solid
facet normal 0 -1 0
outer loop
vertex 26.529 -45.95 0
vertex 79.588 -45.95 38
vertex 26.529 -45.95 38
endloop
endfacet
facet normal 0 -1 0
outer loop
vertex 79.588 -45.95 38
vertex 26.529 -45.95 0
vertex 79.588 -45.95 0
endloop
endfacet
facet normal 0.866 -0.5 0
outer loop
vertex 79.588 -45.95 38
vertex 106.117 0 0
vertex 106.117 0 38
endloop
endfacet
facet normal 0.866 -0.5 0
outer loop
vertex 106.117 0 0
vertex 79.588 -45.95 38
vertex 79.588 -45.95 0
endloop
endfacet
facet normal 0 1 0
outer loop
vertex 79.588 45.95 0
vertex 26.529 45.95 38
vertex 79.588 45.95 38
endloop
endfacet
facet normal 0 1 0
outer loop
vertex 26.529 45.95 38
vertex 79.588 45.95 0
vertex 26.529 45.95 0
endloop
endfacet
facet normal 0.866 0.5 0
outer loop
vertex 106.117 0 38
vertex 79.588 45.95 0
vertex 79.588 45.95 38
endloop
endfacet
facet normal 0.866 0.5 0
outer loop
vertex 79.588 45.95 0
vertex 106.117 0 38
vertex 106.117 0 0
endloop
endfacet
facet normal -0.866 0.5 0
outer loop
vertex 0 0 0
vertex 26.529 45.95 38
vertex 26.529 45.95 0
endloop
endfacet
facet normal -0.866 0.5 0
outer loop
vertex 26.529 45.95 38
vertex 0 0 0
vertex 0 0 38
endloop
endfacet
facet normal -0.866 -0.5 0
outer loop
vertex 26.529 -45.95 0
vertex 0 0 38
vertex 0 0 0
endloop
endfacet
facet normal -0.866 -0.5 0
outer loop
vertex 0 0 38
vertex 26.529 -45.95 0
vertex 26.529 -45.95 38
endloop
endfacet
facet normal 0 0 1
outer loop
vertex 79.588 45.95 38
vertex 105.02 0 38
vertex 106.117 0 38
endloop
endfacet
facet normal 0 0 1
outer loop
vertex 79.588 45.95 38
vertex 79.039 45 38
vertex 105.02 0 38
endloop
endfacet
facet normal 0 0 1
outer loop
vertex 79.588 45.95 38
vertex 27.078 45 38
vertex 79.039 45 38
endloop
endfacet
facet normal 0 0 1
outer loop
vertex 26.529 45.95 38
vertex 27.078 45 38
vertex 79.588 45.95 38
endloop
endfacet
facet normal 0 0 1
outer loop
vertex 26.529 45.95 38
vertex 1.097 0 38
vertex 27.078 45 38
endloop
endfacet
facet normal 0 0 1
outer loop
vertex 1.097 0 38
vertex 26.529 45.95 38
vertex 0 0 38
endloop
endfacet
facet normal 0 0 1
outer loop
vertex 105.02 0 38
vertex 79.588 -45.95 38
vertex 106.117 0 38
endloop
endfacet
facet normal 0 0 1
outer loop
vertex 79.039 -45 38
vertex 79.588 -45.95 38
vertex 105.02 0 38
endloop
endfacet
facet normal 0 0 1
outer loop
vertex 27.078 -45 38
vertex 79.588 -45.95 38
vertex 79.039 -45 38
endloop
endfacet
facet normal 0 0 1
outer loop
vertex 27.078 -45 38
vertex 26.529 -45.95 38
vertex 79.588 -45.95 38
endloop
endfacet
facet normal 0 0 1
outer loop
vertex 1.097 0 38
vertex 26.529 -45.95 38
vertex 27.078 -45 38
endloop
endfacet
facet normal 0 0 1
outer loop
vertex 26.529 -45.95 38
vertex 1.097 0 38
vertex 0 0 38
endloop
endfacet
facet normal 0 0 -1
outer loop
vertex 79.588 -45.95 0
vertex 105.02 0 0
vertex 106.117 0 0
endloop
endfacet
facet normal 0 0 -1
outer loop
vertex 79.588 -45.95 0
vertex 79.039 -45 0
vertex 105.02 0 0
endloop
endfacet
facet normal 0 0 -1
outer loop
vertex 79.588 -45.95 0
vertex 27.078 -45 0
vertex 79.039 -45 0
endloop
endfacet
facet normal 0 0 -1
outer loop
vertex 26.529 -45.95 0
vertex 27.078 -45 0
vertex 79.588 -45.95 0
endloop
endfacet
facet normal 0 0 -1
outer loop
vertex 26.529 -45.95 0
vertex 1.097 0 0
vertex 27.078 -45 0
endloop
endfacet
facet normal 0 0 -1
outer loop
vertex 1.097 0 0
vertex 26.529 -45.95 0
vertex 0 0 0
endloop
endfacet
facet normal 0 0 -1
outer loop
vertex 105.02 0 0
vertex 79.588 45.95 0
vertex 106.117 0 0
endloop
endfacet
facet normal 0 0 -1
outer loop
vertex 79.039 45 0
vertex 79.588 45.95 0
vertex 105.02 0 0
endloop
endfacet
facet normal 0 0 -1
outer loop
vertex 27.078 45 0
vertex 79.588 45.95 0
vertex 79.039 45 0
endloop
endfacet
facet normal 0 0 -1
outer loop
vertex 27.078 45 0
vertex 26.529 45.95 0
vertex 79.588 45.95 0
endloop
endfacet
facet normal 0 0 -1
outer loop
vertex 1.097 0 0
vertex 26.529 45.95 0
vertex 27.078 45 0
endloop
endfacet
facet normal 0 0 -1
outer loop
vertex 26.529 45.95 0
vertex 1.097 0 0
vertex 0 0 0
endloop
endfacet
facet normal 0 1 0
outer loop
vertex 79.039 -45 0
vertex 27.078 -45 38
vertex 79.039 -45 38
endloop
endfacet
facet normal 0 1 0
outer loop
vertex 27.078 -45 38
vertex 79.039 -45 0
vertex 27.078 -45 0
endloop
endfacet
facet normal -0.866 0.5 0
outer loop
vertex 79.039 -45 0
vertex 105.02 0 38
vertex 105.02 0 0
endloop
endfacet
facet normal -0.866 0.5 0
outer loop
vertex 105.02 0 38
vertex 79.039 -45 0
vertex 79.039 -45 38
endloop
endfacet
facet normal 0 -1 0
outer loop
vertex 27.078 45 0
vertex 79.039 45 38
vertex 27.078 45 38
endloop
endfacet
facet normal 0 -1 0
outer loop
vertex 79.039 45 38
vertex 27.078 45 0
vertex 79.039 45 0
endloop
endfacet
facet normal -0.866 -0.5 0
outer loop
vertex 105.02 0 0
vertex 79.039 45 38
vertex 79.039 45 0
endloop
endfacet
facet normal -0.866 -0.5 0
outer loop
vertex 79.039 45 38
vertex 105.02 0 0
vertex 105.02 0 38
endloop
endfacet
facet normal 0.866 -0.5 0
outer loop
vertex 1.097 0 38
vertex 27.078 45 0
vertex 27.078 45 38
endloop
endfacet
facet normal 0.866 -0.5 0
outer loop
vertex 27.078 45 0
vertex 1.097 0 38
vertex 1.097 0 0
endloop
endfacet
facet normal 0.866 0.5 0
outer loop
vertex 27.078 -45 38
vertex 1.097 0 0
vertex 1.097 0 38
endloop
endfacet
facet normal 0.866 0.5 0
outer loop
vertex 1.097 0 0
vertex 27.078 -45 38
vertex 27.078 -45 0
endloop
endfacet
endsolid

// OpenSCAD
// file: measurements.scad
thickness = 1.9;
finger_d = 22;

module holder(h) {
    // Child 0 is the outer shape
    // Child 1 is the inner shape
    // Child 2 is the end-cap hole shape
    // Bottom end
    difference() {
        linear_extrude(thickness) { children(0); }
        translate([0, 0, -1])
            linear_extrude(thickness+2) { children(2); }
    }
    // Main chamber: h + thickness to leave room for the lid.
    translate([0, 0, thickness])
        difference() {
            linear_extrude(h + thickness) { children(0); }
            translate([0, 0, -1])
                linear_extrude(h + thickness + 2) { children(1); }
        }
}

module lid() {
    // Child 0 is the outer shape
    // Child 1 is the inner shape
    // Child 2 is the end-cap hole shape
    // Bottom end
    difference() {
        linear_extrude(thickness) { children(0); }
        translate([0, 0, -1])
            linear_extrude(thickness+2) { children(2); }
    }
    // Cap plug
    translate([0, 0, thickness])
        difference() {
            linear_extrude(thickness) { children(1); }
            translate([0, 0, -1])
                linear_extrude(thickness+2) { children(2); }
        }
}

//
// Discovery Tiles
//

discovery_w = 24;
discovery_count = 21;

function discovery_corner_r(w) = w * 7 / 24;

module discovery_tile_shape(w) {
    r = discovery_corner_r(w);
    translate([-w/2, -w/2]) {
        translate([w-r, w-r])
            circle(r=r, $fn=64);
        square([w-r, w]);
        square([w, w-r]);
    }
}

//
// Ancients
//

ancient_r = 19.5;
ancient_count = 22;

//
// Monotliths/Orbitals
//

monolith_orbital_d = 25.25;
monolith_orbital_count = 22;
// main file
include <measurements.scad>;

// e2e - edge to edge distance of a hexagon.
sector_tile_e2e = 90;
sector_tile_r = e2e_to_r(sector_tile_e2e);
sector_tile_e = sector_tile_r;
sector_tile_h = 2;
num_sector_tiles = 1 + 8 + 11 + 18;


function e2e_to_d(e2e) = e2e/cos(30);
function e2e_to_r(e2e) = e2e_to_d(e2e)/2;

module hex(e2e, h) {
    cylinder(r=e2e_to_r(e2e), h=h, $fn=6);
}

module sectorTiles(n) {
    hex(sector_tile_e2e, h=sector_tile_h*n);
}

module sectorHolder() {
    translate([e2e_to_r(sector_tile_e2e + thickness), 0, 0])
    difference() {
        hex(sector_tile_e2e + thickness, sector_tile_h*num_sector_tiles/2);
        sectorTiles(19);
    }
}

sectorHolder();
